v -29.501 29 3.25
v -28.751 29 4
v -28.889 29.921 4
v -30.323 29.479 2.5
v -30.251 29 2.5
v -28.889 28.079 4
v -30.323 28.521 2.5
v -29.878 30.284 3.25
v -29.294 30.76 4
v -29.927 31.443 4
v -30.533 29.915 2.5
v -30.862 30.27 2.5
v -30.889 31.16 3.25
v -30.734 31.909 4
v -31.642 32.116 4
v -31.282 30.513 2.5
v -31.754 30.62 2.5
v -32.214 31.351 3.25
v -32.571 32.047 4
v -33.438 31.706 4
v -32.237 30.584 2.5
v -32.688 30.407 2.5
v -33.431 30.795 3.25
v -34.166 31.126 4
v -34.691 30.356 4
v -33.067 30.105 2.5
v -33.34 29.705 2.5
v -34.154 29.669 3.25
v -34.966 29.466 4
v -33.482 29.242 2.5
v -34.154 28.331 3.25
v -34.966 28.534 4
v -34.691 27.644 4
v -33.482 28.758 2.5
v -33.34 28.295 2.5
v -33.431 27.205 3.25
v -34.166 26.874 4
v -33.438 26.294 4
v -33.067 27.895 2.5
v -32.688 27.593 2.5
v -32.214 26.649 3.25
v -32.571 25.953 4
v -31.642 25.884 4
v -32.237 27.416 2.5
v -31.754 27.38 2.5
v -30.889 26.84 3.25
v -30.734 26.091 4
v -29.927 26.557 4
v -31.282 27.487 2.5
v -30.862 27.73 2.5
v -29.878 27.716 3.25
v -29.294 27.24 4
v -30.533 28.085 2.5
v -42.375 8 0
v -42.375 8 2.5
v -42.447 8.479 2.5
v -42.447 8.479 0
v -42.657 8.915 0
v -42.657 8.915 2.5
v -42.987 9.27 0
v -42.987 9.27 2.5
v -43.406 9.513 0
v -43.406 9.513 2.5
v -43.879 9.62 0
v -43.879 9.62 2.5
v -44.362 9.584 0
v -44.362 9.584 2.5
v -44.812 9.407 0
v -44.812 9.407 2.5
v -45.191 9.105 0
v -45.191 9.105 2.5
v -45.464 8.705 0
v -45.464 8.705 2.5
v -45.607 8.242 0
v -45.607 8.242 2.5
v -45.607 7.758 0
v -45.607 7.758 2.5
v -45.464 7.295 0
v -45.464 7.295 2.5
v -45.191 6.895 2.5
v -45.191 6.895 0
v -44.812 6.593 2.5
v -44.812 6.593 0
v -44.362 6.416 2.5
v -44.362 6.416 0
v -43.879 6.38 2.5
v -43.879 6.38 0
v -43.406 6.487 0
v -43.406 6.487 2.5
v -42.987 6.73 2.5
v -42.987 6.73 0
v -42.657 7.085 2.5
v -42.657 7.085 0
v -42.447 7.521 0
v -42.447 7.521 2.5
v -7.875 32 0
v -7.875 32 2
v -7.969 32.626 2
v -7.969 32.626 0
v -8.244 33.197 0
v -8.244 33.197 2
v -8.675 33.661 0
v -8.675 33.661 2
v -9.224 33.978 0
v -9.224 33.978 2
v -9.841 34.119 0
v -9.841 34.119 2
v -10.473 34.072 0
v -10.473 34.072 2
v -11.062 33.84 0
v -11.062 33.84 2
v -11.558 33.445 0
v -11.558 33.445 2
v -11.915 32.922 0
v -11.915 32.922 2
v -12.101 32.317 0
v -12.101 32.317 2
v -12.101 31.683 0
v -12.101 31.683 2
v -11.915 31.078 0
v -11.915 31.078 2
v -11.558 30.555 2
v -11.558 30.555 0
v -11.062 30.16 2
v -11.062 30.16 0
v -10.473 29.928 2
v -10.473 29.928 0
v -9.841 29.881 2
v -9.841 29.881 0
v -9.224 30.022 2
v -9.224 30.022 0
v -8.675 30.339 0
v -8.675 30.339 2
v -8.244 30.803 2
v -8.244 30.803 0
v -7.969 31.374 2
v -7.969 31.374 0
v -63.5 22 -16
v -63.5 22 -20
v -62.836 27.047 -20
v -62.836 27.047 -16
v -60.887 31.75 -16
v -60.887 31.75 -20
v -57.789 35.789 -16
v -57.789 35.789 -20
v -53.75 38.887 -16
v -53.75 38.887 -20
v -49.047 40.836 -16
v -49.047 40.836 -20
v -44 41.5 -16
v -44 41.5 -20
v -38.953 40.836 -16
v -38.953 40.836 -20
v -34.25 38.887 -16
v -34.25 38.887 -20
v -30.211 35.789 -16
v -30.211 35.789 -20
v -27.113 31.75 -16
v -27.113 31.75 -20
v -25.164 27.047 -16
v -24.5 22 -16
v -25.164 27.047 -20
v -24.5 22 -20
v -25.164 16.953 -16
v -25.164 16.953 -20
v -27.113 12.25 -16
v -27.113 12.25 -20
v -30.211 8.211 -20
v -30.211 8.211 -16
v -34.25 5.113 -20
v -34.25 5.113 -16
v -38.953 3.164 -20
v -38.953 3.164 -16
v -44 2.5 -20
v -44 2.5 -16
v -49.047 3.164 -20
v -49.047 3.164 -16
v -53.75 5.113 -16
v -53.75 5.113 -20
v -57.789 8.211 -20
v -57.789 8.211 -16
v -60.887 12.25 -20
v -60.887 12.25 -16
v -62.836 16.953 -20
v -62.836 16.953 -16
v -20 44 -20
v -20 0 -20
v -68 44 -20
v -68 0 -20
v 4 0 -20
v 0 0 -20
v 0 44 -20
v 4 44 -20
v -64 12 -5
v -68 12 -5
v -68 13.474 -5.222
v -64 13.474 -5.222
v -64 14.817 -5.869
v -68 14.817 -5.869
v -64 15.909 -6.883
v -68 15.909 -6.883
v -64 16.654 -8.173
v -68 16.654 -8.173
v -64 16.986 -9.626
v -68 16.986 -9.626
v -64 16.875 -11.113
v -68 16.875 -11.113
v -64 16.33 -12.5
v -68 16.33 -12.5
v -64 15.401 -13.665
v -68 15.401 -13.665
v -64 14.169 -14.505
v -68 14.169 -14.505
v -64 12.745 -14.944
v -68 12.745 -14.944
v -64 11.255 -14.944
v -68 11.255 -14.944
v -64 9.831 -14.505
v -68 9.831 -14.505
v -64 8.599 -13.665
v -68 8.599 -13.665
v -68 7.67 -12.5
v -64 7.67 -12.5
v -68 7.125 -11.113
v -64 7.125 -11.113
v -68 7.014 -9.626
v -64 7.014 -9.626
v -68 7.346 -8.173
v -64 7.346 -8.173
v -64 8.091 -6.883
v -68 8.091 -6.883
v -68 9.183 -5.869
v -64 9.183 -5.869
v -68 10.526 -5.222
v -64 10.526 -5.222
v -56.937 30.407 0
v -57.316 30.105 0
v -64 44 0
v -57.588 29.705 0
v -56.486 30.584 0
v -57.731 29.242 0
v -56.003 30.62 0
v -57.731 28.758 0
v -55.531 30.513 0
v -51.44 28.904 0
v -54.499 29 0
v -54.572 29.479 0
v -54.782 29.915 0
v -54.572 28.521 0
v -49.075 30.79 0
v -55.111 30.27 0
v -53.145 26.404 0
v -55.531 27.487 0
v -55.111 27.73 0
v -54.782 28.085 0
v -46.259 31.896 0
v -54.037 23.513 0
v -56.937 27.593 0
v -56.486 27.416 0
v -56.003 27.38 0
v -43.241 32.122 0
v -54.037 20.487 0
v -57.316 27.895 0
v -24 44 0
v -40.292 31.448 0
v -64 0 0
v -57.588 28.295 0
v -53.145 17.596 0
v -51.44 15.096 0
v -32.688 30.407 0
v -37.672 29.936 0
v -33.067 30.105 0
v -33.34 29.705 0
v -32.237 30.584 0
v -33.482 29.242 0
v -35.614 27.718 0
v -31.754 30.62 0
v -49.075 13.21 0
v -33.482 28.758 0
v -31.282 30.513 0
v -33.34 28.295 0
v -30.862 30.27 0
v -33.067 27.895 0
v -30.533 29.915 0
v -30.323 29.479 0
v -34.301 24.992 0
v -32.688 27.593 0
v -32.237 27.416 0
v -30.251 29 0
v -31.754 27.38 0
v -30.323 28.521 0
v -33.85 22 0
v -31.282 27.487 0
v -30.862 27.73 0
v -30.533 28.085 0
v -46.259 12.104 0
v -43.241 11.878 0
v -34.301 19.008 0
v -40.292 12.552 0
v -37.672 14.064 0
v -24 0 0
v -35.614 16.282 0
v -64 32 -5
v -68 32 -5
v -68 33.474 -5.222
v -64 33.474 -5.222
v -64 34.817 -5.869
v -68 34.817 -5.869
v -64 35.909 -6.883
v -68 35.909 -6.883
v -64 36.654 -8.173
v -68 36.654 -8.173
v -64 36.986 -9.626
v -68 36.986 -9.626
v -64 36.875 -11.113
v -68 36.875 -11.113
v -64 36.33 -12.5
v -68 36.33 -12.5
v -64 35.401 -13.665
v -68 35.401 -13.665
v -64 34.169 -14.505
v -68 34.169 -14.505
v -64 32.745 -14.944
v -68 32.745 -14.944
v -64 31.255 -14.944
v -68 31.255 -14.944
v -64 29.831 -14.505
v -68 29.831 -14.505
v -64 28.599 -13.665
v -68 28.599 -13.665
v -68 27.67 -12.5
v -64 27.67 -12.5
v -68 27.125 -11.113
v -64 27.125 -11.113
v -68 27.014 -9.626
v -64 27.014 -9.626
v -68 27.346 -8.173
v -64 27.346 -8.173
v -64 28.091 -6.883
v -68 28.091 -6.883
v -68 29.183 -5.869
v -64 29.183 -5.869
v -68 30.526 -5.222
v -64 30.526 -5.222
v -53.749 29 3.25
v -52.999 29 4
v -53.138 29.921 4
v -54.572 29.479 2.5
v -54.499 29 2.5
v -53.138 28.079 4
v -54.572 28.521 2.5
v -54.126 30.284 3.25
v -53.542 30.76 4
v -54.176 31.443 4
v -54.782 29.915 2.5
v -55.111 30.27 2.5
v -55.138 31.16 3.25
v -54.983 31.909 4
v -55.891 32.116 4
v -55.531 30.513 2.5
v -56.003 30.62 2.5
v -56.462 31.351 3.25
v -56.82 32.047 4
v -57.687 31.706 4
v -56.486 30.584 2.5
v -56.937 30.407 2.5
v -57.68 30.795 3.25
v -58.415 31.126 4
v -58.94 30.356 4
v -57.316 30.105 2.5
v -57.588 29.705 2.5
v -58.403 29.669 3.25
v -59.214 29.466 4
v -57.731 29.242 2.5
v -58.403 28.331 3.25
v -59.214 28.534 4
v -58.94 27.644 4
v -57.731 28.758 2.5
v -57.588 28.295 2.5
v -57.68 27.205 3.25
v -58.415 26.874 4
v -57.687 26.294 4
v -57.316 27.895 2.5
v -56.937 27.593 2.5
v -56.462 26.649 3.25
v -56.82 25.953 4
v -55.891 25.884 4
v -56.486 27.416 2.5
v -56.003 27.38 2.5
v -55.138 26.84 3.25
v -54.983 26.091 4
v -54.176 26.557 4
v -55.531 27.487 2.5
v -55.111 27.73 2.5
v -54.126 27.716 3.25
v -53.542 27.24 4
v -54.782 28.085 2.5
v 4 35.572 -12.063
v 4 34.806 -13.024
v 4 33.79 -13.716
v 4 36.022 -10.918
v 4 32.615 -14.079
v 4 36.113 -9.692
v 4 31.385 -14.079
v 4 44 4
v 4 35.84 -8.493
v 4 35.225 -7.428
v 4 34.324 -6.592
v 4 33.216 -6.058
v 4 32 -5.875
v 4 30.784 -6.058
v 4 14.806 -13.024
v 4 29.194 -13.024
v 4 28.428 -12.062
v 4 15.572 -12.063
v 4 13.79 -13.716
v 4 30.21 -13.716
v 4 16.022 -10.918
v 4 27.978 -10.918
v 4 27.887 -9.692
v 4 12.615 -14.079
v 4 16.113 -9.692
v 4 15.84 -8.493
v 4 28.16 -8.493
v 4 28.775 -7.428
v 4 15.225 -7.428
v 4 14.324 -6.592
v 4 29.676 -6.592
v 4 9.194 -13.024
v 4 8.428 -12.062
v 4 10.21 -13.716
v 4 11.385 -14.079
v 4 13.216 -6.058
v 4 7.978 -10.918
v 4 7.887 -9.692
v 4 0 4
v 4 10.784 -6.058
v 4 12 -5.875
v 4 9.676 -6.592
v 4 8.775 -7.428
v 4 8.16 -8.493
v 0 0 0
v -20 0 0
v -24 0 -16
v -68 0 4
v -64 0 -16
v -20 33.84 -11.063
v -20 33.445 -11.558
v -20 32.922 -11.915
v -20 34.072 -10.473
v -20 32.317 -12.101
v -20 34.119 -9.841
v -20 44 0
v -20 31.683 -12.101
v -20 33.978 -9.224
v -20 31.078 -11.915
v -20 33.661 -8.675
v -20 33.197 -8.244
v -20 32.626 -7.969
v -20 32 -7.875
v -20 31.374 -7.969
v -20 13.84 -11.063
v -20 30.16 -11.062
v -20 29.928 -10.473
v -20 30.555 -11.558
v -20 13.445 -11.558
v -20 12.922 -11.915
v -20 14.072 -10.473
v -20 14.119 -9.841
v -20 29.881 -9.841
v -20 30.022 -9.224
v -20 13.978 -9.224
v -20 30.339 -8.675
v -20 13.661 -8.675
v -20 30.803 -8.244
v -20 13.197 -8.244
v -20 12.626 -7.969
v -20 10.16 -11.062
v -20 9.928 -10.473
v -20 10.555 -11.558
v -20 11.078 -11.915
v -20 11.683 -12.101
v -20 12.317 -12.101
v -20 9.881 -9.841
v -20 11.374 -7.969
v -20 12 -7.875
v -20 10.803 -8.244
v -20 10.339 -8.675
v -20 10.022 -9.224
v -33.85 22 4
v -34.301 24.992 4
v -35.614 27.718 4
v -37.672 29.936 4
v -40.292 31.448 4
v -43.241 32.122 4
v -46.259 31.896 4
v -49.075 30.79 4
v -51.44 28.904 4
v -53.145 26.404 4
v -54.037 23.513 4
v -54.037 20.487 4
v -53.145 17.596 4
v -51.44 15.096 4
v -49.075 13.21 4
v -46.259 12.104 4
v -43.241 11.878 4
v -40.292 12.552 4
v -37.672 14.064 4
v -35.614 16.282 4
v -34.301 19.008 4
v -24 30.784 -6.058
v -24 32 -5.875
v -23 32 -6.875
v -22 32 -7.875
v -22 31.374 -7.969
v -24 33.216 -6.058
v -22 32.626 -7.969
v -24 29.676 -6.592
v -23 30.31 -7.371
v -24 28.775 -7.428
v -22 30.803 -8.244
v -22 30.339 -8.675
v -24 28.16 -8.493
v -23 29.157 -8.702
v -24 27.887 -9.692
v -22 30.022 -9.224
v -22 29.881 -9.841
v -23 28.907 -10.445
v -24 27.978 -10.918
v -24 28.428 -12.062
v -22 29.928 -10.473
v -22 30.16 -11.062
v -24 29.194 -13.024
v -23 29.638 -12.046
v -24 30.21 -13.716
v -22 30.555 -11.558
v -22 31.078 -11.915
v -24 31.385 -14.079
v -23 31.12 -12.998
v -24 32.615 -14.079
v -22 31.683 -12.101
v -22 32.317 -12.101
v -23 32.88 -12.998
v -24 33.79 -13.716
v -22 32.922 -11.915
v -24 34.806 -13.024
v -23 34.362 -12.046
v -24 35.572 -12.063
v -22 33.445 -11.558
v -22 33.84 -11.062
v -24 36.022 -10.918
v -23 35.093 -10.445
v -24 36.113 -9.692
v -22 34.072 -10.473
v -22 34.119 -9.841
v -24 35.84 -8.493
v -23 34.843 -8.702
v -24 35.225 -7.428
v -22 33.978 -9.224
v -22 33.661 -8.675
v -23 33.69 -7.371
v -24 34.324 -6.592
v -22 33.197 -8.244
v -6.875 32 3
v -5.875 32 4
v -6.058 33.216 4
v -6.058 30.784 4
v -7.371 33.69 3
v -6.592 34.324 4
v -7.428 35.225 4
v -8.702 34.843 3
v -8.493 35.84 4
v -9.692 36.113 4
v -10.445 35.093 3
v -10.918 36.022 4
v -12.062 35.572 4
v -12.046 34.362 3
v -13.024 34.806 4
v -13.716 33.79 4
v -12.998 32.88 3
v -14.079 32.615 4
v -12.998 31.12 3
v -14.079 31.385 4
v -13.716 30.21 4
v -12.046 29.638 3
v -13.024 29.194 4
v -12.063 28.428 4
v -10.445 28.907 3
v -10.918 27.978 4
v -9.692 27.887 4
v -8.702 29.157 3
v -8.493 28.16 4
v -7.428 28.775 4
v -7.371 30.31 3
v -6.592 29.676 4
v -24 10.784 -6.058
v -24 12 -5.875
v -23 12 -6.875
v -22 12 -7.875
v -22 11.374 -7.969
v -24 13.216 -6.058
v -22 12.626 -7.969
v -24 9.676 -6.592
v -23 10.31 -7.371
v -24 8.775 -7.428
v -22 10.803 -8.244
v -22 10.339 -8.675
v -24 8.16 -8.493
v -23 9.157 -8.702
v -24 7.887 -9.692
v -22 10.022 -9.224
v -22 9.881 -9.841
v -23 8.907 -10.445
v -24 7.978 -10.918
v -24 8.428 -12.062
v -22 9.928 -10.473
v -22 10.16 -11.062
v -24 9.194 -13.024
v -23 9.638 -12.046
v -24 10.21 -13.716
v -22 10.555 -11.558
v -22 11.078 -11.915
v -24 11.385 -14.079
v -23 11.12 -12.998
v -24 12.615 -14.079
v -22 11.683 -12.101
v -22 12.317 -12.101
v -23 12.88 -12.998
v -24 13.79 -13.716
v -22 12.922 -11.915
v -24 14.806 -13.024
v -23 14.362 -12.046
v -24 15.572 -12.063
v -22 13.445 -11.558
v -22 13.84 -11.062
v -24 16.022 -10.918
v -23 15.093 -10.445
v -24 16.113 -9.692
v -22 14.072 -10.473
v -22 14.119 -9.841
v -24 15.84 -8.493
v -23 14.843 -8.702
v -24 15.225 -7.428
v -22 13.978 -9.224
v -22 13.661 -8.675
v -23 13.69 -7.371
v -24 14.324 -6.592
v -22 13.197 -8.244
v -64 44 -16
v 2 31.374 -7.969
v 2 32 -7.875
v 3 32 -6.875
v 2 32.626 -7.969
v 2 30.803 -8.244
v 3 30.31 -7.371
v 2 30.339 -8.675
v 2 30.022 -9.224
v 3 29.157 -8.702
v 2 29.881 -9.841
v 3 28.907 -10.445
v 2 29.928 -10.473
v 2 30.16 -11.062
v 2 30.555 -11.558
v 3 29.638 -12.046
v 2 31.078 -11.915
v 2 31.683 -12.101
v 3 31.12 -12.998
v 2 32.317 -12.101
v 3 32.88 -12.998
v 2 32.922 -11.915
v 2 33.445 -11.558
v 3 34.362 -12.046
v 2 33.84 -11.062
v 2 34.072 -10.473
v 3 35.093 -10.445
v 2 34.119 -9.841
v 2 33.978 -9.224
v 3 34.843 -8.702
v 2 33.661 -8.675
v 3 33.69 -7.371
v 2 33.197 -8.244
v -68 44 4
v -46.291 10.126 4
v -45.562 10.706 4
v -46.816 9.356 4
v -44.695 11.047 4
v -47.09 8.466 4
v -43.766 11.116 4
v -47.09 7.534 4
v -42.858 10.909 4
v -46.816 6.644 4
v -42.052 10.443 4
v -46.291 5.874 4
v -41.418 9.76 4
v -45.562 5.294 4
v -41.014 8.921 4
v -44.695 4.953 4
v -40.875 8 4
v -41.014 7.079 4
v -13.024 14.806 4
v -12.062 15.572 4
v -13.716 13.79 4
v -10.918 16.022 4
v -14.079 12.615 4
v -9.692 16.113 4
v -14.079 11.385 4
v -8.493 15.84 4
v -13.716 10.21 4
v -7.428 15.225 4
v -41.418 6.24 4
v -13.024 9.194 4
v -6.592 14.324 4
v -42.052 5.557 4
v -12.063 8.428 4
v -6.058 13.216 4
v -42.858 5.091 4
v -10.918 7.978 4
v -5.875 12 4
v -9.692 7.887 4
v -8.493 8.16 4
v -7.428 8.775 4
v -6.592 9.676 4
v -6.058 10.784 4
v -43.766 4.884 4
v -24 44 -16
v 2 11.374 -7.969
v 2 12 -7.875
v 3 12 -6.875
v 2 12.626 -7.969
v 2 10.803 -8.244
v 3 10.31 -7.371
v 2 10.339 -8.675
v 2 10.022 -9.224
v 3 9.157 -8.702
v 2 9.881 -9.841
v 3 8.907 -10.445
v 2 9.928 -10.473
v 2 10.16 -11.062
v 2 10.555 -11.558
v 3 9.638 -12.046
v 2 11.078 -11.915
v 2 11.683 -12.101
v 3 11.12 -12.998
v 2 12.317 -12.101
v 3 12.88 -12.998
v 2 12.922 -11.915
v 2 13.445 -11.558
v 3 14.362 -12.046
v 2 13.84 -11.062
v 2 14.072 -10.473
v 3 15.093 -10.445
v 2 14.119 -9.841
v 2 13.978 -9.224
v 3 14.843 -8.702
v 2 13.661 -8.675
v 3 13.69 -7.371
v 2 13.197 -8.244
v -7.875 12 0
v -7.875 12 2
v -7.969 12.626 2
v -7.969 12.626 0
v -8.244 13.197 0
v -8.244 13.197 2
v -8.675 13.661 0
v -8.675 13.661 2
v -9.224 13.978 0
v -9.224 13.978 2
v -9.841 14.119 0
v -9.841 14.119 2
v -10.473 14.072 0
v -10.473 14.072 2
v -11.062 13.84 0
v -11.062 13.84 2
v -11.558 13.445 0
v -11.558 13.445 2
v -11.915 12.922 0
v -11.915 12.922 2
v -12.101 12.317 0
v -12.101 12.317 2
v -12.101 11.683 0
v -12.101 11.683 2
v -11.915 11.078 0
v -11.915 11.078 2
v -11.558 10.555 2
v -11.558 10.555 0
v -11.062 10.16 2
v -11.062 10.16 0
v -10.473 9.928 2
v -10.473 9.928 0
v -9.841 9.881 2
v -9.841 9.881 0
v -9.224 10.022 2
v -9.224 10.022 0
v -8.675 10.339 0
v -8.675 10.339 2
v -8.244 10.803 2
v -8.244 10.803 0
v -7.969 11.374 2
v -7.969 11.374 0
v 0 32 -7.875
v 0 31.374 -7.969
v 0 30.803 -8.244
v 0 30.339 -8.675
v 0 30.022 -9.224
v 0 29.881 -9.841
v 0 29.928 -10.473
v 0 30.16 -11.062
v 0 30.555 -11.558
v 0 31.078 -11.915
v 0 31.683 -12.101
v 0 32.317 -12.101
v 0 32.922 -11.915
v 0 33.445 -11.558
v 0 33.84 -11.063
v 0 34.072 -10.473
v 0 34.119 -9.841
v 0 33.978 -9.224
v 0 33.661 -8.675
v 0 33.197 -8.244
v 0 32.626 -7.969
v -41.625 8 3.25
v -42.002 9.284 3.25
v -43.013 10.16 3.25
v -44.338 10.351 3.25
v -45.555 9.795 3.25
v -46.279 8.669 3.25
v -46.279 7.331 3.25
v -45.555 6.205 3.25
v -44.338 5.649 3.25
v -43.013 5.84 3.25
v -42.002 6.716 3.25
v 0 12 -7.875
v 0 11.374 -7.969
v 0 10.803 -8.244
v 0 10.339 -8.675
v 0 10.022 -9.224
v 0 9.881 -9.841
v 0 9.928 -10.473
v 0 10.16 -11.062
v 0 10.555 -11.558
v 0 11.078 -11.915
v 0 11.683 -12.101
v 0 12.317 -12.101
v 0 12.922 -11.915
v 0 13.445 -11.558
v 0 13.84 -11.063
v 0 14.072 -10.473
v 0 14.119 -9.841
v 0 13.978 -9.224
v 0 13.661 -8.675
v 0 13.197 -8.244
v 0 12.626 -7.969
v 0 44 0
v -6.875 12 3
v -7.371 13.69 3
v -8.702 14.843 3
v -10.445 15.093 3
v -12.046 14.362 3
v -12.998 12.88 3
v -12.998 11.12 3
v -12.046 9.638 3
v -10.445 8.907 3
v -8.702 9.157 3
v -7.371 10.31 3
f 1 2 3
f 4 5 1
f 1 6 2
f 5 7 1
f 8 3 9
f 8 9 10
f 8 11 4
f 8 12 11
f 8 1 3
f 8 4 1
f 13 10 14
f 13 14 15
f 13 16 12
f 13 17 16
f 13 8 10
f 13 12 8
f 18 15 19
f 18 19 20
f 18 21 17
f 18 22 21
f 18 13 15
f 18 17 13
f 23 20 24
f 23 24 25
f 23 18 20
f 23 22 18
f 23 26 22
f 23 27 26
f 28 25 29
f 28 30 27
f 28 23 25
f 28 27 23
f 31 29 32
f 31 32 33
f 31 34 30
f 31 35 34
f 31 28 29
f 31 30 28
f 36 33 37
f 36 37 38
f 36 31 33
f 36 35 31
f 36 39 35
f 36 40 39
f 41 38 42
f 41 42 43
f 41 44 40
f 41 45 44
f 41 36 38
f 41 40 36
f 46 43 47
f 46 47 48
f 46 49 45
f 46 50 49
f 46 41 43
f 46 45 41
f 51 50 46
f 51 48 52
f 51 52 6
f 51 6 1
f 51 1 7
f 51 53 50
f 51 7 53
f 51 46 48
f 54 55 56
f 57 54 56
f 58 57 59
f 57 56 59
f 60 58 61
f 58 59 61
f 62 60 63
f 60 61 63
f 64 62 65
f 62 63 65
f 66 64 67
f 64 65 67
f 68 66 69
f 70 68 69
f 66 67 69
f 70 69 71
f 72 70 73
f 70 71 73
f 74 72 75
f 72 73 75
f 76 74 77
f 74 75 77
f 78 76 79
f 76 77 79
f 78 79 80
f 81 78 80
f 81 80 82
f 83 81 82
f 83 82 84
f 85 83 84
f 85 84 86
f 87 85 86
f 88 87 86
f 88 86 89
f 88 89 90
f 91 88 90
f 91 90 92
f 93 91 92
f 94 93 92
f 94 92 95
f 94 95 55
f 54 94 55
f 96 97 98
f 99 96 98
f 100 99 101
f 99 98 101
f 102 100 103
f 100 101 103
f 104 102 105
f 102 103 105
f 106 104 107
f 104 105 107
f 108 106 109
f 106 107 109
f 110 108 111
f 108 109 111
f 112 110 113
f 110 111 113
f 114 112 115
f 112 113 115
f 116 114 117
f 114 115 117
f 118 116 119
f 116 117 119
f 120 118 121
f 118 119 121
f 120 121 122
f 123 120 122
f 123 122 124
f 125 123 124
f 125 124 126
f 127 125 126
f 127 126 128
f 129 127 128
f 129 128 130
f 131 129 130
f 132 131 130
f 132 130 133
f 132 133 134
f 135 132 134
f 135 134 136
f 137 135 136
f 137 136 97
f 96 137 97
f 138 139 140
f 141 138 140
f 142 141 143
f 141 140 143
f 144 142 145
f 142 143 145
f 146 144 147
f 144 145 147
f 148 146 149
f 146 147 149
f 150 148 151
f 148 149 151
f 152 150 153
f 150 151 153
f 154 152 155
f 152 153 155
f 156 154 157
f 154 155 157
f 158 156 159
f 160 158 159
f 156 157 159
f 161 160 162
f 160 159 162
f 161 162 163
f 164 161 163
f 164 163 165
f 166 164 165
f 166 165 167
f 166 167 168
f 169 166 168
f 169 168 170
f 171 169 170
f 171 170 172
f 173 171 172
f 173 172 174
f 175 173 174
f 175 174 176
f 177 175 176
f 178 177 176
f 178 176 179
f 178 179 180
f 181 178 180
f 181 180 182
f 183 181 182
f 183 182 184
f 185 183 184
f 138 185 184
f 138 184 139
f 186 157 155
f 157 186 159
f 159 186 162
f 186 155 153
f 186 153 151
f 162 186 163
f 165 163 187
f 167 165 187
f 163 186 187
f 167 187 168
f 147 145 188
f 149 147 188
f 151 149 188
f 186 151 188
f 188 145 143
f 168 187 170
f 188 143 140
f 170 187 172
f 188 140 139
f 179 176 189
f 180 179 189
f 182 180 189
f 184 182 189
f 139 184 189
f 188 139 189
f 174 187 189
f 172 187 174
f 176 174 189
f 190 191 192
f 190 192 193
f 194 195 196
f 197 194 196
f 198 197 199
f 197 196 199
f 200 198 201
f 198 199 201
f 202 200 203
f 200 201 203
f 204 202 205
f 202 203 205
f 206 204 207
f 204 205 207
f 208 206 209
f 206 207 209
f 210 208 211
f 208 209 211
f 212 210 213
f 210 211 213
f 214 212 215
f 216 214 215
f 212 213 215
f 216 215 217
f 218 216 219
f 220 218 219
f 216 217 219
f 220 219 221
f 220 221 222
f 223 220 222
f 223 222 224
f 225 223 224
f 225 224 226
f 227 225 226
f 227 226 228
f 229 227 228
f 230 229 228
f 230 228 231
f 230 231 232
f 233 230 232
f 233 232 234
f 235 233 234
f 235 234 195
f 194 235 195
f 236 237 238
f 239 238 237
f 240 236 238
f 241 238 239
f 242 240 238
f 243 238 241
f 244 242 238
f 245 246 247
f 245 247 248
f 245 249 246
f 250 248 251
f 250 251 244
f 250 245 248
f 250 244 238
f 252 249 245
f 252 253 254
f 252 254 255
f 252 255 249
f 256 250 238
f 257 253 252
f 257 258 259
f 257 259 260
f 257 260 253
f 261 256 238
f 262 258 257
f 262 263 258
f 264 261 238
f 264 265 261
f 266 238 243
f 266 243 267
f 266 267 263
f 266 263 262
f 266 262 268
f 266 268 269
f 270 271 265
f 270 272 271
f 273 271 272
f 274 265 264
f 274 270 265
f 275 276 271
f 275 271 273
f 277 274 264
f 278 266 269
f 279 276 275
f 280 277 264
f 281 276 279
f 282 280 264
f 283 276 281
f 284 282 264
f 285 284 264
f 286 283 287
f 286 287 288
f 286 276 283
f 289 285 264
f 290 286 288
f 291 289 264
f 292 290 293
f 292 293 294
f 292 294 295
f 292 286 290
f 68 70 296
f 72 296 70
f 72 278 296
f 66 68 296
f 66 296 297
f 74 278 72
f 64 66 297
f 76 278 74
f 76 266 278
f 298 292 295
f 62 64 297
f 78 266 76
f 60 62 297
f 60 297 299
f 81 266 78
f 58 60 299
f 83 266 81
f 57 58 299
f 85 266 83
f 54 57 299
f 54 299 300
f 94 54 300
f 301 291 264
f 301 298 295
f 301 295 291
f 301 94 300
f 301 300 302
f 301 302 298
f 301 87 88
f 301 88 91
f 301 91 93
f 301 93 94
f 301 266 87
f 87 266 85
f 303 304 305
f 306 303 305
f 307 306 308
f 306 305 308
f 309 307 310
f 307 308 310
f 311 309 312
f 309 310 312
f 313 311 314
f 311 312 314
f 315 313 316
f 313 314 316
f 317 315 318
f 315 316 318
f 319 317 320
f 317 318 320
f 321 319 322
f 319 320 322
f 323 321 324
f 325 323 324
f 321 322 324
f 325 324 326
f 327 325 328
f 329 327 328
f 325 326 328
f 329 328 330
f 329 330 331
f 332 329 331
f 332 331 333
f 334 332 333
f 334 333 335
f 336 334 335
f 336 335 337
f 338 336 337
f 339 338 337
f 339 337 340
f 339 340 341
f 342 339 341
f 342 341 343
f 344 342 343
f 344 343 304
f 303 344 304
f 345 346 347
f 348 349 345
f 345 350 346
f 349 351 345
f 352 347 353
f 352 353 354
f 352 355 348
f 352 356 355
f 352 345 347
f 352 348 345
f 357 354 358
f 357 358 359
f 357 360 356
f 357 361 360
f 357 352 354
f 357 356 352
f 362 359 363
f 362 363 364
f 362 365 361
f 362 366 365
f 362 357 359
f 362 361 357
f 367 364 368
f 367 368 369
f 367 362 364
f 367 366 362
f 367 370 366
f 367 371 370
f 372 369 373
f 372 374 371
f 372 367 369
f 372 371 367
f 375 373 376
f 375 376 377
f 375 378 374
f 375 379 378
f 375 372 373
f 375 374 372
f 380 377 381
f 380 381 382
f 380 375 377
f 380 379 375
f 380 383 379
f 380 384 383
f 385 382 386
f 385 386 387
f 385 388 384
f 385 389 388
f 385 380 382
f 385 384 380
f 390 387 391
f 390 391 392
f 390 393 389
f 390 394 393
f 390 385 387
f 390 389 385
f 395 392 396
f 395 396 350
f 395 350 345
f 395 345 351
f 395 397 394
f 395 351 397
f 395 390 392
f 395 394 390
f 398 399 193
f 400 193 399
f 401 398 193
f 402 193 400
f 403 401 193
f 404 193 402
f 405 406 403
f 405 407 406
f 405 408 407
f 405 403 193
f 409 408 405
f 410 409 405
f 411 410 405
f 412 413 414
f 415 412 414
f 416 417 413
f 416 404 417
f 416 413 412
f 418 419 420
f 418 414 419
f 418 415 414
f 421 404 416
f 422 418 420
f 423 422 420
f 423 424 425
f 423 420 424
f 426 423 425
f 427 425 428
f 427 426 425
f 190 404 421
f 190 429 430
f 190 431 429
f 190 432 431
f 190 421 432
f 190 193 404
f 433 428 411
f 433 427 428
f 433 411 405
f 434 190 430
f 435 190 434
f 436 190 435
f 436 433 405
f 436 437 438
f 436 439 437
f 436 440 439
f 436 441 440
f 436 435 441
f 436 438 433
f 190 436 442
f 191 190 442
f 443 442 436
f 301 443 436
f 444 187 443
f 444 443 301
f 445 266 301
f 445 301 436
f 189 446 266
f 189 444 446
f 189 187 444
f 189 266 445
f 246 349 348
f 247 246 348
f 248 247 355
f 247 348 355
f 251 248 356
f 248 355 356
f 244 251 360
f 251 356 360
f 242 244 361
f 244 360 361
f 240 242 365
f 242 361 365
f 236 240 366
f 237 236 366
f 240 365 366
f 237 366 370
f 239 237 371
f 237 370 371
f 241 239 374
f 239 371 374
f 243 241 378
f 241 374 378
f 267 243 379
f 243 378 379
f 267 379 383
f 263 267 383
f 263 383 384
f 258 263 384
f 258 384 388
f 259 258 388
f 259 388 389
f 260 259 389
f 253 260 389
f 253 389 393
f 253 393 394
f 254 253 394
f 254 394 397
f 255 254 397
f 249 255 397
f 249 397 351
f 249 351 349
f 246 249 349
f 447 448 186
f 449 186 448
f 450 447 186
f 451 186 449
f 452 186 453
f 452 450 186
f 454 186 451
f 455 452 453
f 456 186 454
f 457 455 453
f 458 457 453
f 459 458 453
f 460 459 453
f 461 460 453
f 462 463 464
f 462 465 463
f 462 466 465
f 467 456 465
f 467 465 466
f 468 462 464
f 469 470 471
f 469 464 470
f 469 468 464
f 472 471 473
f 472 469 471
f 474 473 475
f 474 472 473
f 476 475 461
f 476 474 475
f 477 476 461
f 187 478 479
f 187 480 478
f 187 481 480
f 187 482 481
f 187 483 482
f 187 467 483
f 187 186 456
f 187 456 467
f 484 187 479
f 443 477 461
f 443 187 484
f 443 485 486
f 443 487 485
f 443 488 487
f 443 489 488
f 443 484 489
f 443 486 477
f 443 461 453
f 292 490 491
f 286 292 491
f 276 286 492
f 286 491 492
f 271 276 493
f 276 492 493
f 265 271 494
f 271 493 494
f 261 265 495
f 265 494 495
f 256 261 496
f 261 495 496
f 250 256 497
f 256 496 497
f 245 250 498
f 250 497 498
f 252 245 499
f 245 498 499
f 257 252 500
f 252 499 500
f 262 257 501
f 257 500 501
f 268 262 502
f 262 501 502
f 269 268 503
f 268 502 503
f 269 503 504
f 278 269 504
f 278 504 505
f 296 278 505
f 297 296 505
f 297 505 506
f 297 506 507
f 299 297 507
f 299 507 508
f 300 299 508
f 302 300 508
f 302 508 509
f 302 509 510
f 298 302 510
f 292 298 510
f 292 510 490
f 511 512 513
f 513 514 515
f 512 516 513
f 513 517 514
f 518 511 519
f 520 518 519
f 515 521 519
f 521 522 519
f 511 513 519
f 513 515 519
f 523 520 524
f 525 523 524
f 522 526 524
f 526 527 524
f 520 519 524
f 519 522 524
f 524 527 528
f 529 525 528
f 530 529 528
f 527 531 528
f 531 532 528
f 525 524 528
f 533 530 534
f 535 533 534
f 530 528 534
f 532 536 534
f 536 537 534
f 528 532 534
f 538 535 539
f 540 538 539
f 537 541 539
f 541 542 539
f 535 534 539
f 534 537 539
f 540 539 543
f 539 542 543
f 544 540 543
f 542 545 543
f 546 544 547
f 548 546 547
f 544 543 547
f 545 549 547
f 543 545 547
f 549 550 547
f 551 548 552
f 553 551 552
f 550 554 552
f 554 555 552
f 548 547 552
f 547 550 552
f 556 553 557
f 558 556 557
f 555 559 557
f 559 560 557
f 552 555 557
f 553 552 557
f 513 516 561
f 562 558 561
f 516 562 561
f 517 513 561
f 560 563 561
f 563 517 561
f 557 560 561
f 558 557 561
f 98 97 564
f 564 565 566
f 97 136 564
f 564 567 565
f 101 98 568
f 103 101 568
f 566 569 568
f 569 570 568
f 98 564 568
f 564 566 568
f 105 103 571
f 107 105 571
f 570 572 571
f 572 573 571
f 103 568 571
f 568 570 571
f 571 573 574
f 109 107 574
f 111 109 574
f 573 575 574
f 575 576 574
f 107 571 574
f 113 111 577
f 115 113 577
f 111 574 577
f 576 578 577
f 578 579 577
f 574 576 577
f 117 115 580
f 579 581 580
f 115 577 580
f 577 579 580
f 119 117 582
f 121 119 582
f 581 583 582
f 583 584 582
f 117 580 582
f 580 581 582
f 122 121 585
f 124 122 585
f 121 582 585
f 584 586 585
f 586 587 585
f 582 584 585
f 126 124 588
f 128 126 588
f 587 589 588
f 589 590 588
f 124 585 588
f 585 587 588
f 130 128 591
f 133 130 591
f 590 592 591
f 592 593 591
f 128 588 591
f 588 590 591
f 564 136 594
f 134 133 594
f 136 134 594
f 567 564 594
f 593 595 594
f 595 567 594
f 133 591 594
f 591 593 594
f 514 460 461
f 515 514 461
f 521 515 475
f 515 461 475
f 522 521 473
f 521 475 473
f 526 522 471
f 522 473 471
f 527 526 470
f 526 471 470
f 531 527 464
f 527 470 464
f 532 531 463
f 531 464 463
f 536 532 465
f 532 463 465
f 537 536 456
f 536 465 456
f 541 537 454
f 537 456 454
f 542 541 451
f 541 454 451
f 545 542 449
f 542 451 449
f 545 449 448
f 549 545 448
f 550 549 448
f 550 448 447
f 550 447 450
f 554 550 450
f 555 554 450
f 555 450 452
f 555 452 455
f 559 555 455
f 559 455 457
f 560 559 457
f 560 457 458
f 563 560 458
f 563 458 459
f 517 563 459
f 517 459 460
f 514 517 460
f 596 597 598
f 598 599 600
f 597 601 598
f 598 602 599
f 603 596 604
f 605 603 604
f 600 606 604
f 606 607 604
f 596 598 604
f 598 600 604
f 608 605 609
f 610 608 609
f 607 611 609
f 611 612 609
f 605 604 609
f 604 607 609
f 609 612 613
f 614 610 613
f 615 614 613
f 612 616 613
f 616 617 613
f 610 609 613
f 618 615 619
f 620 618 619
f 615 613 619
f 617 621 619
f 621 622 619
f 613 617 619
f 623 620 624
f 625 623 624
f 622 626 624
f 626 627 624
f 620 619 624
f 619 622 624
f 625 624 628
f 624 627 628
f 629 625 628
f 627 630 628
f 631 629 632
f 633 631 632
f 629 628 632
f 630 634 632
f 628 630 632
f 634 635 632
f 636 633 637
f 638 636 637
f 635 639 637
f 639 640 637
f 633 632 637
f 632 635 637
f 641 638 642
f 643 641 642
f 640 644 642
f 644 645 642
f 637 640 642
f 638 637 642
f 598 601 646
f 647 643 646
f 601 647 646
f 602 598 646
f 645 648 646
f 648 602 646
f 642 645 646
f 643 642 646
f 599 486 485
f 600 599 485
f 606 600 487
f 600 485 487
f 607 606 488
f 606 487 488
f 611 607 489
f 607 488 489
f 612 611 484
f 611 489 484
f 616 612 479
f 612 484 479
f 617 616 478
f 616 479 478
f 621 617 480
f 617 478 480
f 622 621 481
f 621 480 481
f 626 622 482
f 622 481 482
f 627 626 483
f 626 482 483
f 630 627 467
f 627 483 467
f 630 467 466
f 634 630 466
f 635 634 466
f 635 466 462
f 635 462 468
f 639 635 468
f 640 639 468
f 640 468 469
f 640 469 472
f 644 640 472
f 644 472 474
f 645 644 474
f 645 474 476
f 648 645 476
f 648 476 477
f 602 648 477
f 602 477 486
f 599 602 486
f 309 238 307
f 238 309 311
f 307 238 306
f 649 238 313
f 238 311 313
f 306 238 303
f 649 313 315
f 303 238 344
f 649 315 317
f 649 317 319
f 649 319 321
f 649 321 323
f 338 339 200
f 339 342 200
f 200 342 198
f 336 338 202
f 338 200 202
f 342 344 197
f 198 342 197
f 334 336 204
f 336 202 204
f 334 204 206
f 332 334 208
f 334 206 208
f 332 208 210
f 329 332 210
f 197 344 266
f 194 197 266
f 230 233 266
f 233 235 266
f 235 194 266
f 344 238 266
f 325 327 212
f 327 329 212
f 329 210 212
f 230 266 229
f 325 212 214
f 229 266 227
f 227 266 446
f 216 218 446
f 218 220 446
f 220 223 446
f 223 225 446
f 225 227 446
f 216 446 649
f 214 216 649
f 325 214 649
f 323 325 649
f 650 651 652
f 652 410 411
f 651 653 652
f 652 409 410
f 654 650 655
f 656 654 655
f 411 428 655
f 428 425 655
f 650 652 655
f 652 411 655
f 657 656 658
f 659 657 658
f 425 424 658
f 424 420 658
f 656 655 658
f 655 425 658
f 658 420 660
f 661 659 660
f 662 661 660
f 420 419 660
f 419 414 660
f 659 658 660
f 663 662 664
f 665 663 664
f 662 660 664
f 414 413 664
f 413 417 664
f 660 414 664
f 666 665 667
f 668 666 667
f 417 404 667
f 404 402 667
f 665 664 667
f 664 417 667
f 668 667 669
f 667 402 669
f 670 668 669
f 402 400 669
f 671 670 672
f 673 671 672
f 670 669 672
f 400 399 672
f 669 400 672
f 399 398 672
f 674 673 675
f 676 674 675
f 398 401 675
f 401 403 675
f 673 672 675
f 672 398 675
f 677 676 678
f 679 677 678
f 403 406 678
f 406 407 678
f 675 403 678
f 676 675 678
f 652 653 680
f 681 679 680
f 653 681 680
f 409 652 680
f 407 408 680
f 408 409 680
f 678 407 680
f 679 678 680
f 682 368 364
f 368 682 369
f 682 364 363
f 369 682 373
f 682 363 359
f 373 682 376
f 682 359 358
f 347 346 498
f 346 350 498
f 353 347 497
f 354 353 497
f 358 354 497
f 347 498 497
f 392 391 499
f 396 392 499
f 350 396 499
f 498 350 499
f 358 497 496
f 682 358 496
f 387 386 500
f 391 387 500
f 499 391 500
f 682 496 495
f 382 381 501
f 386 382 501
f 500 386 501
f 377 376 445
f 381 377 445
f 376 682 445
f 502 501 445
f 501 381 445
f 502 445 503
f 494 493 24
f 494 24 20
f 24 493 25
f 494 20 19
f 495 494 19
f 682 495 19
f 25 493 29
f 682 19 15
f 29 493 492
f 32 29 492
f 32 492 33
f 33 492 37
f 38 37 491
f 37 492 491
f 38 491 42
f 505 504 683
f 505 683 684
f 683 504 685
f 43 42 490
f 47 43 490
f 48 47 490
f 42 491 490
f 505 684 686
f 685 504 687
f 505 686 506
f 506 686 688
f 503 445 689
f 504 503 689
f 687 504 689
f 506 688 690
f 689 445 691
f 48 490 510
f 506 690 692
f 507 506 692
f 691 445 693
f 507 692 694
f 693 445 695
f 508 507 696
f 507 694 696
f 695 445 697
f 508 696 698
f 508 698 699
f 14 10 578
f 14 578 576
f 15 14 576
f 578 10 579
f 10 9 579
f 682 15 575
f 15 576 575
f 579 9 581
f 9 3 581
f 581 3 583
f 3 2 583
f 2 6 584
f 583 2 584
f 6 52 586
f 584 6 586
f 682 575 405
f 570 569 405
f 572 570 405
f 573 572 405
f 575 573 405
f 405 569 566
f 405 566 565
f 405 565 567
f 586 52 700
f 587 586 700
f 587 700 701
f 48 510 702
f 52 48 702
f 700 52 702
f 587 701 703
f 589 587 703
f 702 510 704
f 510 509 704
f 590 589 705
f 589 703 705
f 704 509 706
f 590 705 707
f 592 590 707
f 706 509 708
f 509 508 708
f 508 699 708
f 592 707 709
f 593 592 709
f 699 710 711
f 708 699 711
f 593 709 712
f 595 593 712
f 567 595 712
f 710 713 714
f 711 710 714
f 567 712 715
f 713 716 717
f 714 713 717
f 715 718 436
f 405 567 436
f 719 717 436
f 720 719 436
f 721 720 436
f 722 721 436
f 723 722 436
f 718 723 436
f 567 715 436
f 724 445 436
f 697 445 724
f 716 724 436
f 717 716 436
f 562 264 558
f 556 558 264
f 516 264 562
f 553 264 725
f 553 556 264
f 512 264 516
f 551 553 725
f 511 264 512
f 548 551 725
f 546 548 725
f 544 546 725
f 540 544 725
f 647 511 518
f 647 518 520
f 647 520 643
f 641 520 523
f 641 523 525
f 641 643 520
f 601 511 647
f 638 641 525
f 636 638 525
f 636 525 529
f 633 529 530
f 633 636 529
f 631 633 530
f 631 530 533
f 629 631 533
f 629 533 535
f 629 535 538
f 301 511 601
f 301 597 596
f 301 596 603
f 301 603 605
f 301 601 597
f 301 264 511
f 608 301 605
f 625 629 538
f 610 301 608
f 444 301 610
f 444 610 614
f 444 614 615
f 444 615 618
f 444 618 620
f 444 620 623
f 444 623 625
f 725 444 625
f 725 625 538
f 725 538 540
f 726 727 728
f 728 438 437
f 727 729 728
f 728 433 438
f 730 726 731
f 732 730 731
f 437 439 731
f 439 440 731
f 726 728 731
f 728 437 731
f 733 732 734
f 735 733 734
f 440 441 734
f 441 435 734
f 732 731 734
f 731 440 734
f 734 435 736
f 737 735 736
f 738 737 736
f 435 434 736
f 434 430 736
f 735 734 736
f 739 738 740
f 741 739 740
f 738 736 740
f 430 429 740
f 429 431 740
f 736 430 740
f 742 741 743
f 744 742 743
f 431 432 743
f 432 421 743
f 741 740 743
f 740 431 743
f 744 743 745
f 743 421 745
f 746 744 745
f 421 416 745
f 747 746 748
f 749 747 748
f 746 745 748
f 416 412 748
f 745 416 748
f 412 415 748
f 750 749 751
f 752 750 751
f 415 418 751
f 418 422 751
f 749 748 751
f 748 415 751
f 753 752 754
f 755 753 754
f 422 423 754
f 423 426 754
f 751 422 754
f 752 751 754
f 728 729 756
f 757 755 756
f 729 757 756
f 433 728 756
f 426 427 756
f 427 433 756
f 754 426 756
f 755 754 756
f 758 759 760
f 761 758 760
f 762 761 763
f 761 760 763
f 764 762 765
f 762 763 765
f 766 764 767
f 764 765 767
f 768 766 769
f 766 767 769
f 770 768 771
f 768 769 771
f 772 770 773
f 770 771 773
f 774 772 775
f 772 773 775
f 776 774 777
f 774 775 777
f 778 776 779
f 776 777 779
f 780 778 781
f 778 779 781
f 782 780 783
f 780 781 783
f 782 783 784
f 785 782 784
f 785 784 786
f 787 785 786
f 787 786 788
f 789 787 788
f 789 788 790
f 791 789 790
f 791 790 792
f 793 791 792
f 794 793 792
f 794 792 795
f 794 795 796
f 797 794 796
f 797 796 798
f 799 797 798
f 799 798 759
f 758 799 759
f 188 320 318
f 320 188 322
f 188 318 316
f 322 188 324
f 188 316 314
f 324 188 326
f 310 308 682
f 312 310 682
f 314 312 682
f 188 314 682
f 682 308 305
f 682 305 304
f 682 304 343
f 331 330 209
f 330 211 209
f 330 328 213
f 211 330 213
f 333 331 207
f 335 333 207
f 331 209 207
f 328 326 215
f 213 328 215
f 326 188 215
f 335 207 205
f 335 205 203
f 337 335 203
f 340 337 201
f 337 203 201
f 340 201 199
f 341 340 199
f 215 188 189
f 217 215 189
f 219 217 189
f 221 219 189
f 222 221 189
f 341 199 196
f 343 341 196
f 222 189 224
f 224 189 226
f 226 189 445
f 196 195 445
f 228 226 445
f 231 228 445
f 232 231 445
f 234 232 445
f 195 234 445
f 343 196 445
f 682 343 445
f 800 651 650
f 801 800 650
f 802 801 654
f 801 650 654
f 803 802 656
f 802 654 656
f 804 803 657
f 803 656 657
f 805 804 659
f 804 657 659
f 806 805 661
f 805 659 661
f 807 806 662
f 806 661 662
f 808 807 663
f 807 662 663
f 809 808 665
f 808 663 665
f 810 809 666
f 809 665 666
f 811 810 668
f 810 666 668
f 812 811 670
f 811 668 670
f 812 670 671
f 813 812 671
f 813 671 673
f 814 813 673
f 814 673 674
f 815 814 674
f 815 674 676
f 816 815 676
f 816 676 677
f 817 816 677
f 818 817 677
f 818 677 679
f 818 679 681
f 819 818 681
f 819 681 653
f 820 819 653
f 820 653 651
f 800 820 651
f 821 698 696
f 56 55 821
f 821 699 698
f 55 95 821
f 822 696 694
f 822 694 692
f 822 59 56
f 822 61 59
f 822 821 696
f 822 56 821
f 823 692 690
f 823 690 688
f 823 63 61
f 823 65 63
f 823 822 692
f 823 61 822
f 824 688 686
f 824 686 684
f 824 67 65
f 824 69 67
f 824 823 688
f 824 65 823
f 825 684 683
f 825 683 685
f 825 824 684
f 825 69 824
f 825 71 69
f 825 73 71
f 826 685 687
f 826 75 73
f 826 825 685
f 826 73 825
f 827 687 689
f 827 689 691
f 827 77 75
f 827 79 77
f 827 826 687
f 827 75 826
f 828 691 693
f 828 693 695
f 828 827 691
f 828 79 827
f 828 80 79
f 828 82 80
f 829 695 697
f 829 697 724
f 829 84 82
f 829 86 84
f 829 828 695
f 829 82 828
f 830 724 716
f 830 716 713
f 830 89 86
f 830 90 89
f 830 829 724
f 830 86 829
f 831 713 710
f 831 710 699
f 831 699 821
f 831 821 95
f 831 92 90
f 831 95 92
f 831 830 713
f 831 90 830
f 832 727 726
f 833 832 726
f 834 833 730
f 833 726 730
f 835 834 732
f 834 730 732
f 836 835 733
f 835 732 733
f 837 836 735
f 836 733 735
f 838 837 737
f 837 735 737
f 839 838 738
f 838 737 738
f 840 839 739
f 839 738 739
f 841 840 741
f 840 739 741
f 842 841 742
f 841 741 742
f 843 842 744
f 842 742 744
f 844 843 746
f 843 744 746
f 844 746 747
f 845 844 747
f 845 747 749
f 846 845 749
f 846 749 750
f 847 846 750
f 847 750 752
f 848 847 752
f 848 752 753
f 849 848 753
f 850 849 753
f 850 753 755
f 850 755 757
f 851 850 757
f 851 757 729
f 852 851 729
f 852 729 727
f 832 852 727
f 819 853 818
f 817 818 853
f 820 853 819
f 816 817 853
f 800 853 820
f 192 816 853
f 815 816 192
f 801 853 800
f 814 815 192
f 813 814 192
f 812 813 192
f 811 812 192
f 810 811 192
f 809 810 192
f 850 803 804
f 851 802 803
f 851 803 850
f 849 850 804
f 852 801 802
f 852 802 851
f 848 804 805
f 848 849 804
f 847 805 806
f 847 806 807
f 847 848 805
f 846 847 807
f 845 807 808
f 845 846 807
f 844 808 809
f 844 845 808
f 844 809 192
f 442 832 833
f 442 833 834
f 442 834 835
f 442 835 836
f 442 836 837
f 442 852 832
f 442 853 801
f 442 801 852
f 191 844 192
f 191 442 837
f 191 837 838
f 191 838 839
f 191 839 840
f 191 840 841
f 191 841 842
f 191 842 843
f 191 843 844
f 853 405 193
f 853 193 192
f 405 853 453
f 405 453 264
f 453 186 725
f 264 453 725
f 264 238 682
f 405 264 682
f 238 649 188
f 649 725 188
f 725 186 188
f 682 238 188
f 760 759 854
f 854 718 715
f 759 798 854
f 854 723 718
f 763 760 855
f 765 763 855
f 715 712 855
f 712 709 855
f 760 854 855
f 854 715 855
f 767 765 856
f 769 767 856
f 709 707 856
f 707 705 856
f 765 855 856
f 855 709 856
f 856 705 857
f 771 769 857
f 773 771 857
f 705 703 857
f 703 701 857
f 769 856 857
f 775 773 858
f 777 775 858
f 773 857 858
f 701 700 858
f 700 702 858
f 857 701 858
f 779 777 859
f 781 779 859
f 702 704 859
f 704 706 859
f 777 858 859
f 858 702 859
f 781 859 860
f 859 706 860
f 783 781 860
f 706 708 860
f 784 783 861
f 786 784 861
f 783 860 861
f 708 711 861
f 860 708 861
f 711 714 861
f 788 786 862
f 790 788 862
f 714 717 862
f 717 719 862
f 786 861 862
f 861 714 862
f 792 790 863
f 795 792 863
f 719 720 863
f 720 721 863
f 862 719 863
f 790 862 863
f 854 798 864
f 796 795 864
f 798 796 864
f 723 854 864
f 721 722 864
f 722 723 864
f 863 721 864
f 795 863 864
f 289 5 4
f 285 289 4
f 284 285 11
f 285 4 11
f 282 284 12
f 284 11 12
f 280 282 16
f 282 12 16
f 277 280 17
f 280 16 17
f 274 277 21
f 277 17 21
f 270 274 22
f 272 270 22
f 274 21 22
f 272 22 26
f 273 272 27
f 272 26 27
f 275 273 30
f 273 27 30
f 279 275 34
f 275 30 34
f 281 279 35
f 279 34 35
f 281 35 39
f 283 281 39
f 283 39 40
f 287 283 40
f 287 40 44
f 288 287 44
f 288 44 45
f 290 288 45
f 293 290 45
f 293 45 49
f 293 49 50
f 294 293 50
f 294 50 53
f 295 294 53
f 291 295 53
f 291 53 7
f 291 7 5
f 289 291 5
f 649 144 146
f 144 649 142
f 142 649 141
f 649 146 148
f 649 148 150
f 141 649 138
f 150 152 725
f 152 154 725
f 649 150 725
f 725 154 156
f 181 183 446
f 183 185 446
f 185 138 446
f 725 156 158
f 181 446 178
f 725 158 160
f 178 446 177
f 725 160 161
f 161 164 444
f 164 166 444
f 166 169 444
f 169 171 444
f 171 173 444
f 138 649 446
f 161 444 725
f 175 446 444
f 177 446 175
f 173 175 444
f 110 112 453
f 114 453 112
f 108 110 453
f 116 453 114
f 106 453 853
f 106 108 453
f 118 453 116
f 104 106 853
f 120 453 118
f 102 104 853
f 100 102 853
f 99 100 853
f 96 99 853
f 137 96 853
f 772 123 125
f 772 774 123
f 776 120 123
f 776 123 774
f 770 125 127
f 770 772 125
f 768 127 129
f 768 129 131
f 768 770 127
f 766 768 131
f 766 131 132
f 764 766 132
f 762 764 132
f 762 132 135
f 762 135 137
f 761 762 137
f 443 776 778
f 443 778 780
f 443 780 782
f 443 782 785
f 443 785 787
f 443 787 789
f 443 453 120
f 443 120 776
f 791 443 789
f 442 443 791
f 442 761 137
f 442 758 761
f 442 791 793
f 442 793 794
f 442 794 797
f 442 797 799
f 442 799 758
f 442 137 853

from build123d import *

# Parameters (mm, degrees)
SKETCH1_W           = 40
SKETCH1_H           = 16
BOSS_EXTRUDE1_DEPTH = 44
CUT_EXTRUDE1_REACH  = 86.475
SKETCH3_R           = 19.5
CUT_EXTRUDE2_REACH  = 86.475
SKETCH4_R           = 10.15
SKETCH4_R_2         = 1.625
SKETCH5_R           = 2.125
CUT_EXTRUDE3_DEPTH  = 87.717933555
CUT_EXTRUDE4_REACH  = 86.475
SKETCH6_R           = 2.125
CHAMFER1_SIZE       = 2
CHAMFER2_SIZE       = 1.5
CUT_EXTRUDE5_REACH  = 88.718
SKETCH7_R           = 5


with BuildPart() as part:
    # Sketch1 → Boss-Extrude1 (new body)
    with BuildSketch(Plane(origin=(0, 0, 0), x_dir=(1, 0, 0), z_dir=(0, 1, 0))):
        Polygon((0, 0), (0, 20), (4, 20), (4, -4), (-24, -4), (-68, -4), (-68, 0), (-68, 16), (-68, 20), (-24, 20), (-20, 20), (-20, 0), align=None)
        with Locations((-44, 8)):
            Rectangle(SKETCH1_W, SKETCH1_H, mode=Mode.SUBTRACT)
    extrude(amount=BOSS_EXTRUDE1_DEPTH)

    # Sketch3 → Cut-Extrude1 (cut, up to next)
    with BuildSketch(Plane(origin=(0, 0, -20), x_dir=(-1, 0, 0), z_dir=(0, 0, -1)), mode=Mode.PRIVATE) as cut_extrude1_sk1:
        with Locations((44, 22)):
            Circle(SKETCH3_R)
    cut_extrude1_tool1 = extrude(cut_extrude1_sk1.sketch, amount=-CUT_EXTRUDE1_REACH, mode=Mode.PRIVATE) & part.part
    add(cut_extrude1_tool1.solids().sort_by_distance((-44, 22, -20))[0], mode=Mode.SUBTRACT)

    # Sketch4 → Cut-Extrude2 (cut, up to next)
    with BuildSketch(Plane.XY.offset(4), mode=Mode.PRIVATE) as cut_extrude2_sk1:
        with Locations((-44, 22)):
            Circle(SKETCH4_R)
    cut_extrude2_tool1 = extrude(cut_extrude2_sk1.sketch, amount=-CUT_EXTRUDE2_REACH, mode=Mode.PRIVATE) & part.part
    # Sketch4 → Cut-Extrude2 (cut, up to next)
    with BuildSketch(Plane.XY.offset(4), mode=Mode.PRIVATE) as cut_extrude2_sk2:
        with Locations((-56.124355653, 29)):
            Circle(SKETCH4_R_2)
    cut_extrude2_tool2 = extrude(cut_extrude2_sk2.sketch, amount=-CUT_EXTRUDE2_REACH, mode=Mode.PRIVATE) & part.part
    # Sketch4 → Cut-Extrude2 (cut, up to next)
    with BuildSketch(Plane.XY.offset(4), mode=Mode.PRIVATE) as cut_extrude2_sk3:
        with Locations((-31.875644347, 29)):
            Circle(SKETCH4_R_2)
    cut_extrude2_tool3 = extrude(cut_extrude2_sk3.sketch, amount=-CUT_EXTRUDE2_REACH, mode=Mode.PRIVATE) & part.part
    # Sketch4 → Cut-Extrude2 (cut, up to next)
    with BuildSketch(Plane.XY.offset(4), mode=Mode.PRIVATE) as cut_extrude2_sk4:
        with Locations((-44, 8)):
            Circle(SKETCH4_R_2)
    cut_extrude2_tool4 = extrude(cut_extrude2_sk4.sketch, amount=-CUT_EXTRUDE2_REACH, mode=Mode.PRIVATE) & part.part
    add(cut_extrude2_tool1.solids().sort_by_distance((-44, 22, 4))[0], mode=Mode.SUBTRACT)
    add(cut_extrude2_tool2.solids().sort_by_distance((-56.124356, 29, 4))[0], mode=Mode.SUBTRACT)
    add(cut_extrude2_tool3.solids().sort_by_distance((-31.875644, 29, 4))[0], mode=Mode.SUBTRACT)
    add(cut_extrude2_tool4.solids().sort_by_distance((-44, 8, 4))[0], mode=Mode.SUBTRACT)

    # Sketch5 → Cut-Extrude3 (cut, through all)
    with BuildSketch(Plane(origin=(4, 0, 0), x_dir=(0, 0, -1), z_dir=(1, 0, 0))):
        with Locations(Location((10, 32, 0), (0, 0, 180))):
            Circle(SKETCH5_R)
        with Locations(Location((10, 12, 0), (0, 0, 180))):
            Circle(SKETCH5_R)
    extrude(amount=-CUT_EXTRUDE3_DEPTH, mode=Mode.SUBTRACT)

    # Sketch6 → Cut-Extrude4 (cut, up to next)
    with BuildSketch(Plane.XY.offset(4), mode=Mode.PRIVATE) as cut_extrude4_sk1:
        with Locations((-10, 32)):
            Circle(SKETCH6_R)
    cut_extrude4_tool1 = extrude(cut_extrude4_sk1.sketch, amount=-CUT_EXTRUDE4_REACH, mode=Mode.PRIVATE) & part.part
    # Sketch6 → Cut-Extrude4 (cut, up to next)
    with BuildSketch(Plane.XY.offset(4), mode=Mode.PRIVATE) as cut_extrude4_sk2:
        with Locations((-10, 12)):
            Circle(SKETCH6_R)
    cut_extrude4_tool2 = extrude(cut_extrude4_sk2.sketch, amount=-CUT_EXTRUDE4_REACH, mode=Mode.PRIVATE) & part.part
    add(cut_extrude4_tool1.solids().sort_by_distance((-10, 32, 4))[0], mode=Mode.SUBTRACT)
    add(cut_extrude4_tool2.solids().sort_by_distance((-10, 12, 4))[0], mode=Mode.SUBTRACT)

    # Chamfer1
    chamfer1_edges = [part.edges().sort_by_distance(p)[0] for p in [
        (-12.125, 12, 4),
        (-24, 32, -12.125),
        (4, 32, -12.125),
        (-24, 12, -12.125),
        (4, 12, -12.125),
        (-12.125, 32, 4),
    ]]
    chamfer(chamfer1_edges, length=CHAMFER1_SIZE)

    # Chamfer2
    chamfer2_edges = [part.edges().sort_by_distance(p)[0] for p in [
        (-45.625, 8, 4),
        (-33.500644347, 29, 4),
        (-57.749355653, 29, 4),
    ]]
    chamfer(chamfer2_edges, length=CHAMFER2_SIZE)

    # Sketch7 → Cut-Extrude5 (cut, up to next)
    with BuildSketch(Plane.ZY.offset(68), mode=Mode.PRIVATE) as cut_extrude5_sk1:
        with Locations((-10, 32)):
            Circle(SKETCH7_R)
    cut_extrude5_tool1 = extrude(cut_extrude5_sk1.sketch, amount=-CUT_EXTRUDE5_REACH, mode=Mode.PRIVATE) & part.part
    # Sketch7 → Cut-Extrude5 (cut, up to next)
    with BuildSketch(Plane.ZY.offset(68), mode=Mode.PRIVATE) as cut_extrude5_sk2:
        with Locations((-10, 12)):
            Circle(SKETCH7_R)
    cut_extrude5_tool2 = extrude(cut_extrude5_sk2.sketch, amount=-CUT_EXTRUDE5_REACH, mode=Mode.PRIVATE) & part.part
    add(cut_extrude5_tool1.solids().sort_by_distance((-68, 32, -10))[0], mode=Mode.SUBTRACT)
    add(cut_extrude5_tool2.solids().sort_by_distance((-68, 12, -10))[0], mode=Mode.SUBTRACT)


solid = part.part
